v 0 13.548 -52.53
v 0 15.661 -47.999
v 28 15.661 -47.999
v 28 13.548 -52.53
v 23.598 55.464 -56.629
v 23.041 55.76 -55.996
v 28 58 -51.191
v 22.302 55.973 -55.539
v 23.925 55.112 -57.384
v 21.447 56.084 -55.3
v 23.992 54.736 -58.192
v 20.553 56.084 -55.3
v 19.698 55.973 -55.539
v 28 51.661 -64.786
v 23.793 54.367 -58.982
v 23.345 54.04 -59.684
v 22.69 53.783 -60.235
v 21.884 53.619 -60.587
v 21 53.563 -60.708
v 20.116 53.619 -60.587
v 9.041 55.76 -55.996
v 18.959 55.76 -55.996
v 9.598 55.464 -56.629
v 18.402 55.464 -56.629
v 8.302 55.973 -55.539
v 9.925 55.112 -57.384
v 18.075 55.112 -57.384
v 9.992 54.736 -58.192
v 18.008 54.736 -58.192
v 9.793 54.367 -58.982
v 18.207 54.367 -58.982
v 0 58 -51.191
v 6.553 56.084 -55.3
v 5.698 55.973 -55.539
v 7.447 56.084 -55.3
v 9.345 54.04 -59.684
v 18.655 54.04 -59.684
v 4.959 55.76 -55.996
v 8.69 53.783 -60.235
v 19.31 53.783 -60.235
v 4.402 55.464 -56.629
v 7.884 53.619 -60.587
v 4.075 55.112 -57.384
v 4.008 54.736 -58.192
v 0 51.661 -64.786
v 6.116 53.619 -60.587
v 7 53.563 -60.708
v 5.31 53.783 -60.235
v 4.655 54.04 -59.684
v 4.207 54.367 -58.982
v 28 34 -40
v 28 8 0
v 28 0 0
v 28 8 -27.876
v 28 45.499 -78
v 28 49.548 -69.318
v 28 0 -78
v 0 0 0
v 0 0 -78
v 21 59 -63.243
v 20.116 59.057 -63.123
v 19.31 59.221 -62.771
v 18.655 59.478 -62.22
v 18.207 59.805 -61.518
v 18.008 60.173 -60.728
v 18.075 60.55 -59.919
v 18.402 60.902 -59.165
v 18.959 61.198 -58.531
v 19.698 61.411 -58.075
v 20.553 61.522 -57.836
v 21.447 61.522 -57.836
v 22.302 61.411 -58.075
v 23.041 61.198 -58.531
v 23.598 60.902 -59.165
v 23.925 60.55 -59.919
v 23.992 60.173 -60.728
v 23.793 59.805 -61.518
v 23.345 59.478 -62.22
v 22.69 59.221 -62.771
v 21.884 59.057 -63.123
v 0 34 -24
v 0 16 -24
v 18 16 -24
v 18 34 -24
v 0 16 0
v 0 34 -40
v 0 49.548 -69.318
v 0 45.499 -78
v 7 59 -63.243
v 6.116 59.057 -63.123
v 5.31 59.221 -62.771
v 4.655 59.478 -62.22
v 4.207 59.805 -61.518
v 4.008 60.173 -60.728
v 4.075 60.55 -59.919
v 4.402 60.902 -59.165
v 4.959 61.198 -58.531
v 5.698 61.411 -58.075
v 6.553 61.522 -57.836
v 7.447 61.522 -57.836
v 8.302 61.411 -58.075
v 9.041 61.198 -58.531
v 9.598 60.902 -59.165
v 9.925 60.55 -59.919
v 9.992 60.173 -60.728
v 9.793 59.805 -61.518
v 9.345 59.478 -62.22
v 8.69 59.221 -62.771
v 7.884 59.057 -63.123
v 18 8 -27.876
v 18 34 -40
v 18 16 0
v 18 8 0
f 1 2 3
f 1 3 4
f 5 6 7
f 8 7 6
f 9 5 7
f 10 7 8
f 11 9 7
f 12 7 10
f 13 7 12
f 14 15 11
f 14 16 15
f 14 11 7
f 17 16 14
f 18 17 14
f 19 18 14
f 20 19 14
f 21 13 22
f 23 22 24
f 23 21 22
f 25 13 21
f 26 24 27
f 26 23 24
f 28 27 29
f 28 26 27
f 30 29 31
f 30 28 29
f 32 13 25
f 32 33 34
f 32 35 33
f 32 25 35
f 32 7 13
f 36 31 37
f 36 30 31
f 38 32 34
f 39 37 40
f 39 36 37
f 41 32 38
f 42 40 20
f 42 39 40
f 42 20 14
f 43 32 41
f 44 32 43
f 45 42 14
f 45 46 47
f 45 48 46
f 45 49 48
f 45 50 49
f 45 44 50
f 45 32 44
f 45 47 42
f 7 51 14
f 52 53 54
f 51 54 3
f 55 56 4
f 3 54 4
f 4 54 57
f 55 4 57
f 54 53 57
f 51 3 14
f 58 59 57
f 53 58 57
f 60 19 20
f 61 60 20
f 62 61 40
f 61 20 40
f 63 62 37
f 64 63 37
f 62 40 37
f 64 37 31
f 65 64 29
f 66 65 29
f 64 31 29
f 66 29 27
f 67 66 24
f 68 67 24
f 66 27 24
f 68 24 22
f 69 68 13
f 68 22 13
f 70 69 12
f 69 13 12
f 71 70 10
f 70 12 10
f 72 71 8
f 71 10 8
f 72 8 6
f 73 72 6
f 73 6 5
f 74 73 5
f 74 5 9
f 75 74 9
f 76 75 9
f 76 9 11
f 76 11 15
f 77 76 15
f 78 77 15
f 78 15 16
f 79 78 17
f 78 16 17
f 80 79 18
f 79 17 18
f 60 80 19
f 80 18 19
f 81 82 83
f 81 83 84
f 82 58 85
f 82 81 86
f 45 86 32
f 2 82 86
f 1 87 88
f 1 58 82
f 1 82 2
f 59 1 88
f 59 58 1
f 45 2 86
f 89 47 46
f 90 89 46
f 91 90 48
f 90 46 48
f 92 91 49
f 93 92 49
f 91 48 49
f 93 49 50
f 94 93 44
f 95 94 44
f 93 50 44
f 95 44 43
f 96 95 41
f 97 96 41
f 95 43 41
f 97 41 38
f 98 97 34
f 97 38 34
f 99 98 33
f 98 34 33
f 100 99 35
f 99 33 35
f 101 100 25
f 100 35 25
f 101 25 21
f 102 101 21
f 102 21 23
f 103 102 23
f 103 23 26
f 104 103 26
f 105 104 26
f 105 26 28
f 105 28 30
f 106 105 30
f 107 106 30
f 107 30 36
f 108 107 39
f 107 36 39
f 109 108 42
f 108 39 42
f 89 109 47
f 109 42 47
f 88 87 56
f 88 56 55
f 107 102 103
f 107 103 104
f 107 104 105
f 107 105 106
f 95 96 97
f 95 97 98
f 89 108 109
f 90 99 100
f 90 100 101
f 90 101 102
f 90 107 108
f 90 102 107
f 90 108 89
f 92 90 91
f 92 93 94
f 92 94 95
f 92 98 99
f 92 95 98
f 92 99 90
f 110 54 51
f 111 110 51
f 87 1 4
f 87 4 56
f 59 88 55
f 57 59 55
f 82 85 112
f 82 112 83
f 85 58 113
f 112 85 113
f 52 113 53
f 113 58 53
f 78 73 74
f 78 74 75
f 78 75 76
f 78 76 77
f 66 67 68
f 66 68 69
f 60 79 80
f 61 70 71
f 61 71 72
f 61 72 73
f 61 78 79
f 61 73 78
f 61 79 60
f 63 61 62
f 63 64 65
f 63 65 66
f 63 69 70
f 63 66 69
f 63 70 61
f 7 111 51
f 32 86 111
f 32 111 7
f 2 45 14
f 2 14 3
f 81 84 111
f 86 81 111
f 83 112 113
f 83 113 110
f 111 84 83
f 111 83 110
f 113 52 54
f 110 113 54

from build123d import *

# Parameters (mm, degrees)
SKETCH1_W           = 28
SKETCH1_H           = 78
BOSS_EXTRUDE1_DEPTH = 58
SKETCH2_OUTSIDE_W   = 100.23
SKETCH2_OUTSIDE_H   = 80.23
CUT_EXTRUDE1_DEPTH  = 102.153348931
CUT_EXTRUDE2_DEPTH  = 10
SKETCH3_R           = 3
BOSS_EXTRUDE2_DEPTH = 6


with BuildPart() as part:
    # Sketch1 → Boss-Extrude1 (new body)
    with BuildSketch(Plane(origin=(0, 0, 0), x_dir=(1, 0, 0), z_dir=(0, 1, 0))):
        with Locations((14, 39)):
            Rectangle(SKETCH1_W, SKETCH1_H)
    extrude(amount=BOSS_EXTRUDE1_DEPTH)

    # Sketch2 outside → Cut-Extrude1 (cut, through all)
    with BuildSketch(Plane(origin=(28, 0, 0), x_dir=(0, 0, -1), z_dir=(1, 0, 0))):
        with Locations((39, 29)):
            Rectangle(SKETCH2_OUTSIDE_W, SKETCH2_OUTSIDE_H)
        Polygon((0, 0), (78, 0), (78, 45.498936959), (69.317539536, 49.547634765), (52.530463843, 13.547634765), (47.998924908, 15.660726074), (64.786000601, 51.660726074), (51.191383796, 58), (40, 34), (24, 34), (24, 16), (0, 16), align=None, mode=Mode.SUBTRACT)
    extrude(amount=-CUT_EXTRUDE1_DEPTH, mode=Mode.SUBTRACT)

    # Sketch2<3> → Cut-Extrude2 (cut)
    with BuildSketch(Plane(origin=(28, 0, 0), x_dir=(0, 0, -1), z_dir=(1, 0, 0))):
        Polygon((0, 16), (0, 8), (27.876000888, 8), (40, 34), (24, 34), (24, 16), align=None)
    extrude(amount=-CUT_EXTRUDE2_DEPTH, mode=Mode.SUBTRACT)

    # Sketch3 → Boss-Extrude2 (add)
    with BuildSketch(Plane(origin=(0, 67.248278227, -31.358387135), x_dir=(1, 0, 0), z_dir=(0, 0.906307787036651, -0.4226182617406971))):
        with Locations((7, 29.383290582)):
            Circle(SKETCH3_R)
        with Locations((21, 29.383290582)):
            Circle(SKETCH3_R)
    extrude(amount=BOSS_EXTRUDE2_DEPTH)


solid = part.part
